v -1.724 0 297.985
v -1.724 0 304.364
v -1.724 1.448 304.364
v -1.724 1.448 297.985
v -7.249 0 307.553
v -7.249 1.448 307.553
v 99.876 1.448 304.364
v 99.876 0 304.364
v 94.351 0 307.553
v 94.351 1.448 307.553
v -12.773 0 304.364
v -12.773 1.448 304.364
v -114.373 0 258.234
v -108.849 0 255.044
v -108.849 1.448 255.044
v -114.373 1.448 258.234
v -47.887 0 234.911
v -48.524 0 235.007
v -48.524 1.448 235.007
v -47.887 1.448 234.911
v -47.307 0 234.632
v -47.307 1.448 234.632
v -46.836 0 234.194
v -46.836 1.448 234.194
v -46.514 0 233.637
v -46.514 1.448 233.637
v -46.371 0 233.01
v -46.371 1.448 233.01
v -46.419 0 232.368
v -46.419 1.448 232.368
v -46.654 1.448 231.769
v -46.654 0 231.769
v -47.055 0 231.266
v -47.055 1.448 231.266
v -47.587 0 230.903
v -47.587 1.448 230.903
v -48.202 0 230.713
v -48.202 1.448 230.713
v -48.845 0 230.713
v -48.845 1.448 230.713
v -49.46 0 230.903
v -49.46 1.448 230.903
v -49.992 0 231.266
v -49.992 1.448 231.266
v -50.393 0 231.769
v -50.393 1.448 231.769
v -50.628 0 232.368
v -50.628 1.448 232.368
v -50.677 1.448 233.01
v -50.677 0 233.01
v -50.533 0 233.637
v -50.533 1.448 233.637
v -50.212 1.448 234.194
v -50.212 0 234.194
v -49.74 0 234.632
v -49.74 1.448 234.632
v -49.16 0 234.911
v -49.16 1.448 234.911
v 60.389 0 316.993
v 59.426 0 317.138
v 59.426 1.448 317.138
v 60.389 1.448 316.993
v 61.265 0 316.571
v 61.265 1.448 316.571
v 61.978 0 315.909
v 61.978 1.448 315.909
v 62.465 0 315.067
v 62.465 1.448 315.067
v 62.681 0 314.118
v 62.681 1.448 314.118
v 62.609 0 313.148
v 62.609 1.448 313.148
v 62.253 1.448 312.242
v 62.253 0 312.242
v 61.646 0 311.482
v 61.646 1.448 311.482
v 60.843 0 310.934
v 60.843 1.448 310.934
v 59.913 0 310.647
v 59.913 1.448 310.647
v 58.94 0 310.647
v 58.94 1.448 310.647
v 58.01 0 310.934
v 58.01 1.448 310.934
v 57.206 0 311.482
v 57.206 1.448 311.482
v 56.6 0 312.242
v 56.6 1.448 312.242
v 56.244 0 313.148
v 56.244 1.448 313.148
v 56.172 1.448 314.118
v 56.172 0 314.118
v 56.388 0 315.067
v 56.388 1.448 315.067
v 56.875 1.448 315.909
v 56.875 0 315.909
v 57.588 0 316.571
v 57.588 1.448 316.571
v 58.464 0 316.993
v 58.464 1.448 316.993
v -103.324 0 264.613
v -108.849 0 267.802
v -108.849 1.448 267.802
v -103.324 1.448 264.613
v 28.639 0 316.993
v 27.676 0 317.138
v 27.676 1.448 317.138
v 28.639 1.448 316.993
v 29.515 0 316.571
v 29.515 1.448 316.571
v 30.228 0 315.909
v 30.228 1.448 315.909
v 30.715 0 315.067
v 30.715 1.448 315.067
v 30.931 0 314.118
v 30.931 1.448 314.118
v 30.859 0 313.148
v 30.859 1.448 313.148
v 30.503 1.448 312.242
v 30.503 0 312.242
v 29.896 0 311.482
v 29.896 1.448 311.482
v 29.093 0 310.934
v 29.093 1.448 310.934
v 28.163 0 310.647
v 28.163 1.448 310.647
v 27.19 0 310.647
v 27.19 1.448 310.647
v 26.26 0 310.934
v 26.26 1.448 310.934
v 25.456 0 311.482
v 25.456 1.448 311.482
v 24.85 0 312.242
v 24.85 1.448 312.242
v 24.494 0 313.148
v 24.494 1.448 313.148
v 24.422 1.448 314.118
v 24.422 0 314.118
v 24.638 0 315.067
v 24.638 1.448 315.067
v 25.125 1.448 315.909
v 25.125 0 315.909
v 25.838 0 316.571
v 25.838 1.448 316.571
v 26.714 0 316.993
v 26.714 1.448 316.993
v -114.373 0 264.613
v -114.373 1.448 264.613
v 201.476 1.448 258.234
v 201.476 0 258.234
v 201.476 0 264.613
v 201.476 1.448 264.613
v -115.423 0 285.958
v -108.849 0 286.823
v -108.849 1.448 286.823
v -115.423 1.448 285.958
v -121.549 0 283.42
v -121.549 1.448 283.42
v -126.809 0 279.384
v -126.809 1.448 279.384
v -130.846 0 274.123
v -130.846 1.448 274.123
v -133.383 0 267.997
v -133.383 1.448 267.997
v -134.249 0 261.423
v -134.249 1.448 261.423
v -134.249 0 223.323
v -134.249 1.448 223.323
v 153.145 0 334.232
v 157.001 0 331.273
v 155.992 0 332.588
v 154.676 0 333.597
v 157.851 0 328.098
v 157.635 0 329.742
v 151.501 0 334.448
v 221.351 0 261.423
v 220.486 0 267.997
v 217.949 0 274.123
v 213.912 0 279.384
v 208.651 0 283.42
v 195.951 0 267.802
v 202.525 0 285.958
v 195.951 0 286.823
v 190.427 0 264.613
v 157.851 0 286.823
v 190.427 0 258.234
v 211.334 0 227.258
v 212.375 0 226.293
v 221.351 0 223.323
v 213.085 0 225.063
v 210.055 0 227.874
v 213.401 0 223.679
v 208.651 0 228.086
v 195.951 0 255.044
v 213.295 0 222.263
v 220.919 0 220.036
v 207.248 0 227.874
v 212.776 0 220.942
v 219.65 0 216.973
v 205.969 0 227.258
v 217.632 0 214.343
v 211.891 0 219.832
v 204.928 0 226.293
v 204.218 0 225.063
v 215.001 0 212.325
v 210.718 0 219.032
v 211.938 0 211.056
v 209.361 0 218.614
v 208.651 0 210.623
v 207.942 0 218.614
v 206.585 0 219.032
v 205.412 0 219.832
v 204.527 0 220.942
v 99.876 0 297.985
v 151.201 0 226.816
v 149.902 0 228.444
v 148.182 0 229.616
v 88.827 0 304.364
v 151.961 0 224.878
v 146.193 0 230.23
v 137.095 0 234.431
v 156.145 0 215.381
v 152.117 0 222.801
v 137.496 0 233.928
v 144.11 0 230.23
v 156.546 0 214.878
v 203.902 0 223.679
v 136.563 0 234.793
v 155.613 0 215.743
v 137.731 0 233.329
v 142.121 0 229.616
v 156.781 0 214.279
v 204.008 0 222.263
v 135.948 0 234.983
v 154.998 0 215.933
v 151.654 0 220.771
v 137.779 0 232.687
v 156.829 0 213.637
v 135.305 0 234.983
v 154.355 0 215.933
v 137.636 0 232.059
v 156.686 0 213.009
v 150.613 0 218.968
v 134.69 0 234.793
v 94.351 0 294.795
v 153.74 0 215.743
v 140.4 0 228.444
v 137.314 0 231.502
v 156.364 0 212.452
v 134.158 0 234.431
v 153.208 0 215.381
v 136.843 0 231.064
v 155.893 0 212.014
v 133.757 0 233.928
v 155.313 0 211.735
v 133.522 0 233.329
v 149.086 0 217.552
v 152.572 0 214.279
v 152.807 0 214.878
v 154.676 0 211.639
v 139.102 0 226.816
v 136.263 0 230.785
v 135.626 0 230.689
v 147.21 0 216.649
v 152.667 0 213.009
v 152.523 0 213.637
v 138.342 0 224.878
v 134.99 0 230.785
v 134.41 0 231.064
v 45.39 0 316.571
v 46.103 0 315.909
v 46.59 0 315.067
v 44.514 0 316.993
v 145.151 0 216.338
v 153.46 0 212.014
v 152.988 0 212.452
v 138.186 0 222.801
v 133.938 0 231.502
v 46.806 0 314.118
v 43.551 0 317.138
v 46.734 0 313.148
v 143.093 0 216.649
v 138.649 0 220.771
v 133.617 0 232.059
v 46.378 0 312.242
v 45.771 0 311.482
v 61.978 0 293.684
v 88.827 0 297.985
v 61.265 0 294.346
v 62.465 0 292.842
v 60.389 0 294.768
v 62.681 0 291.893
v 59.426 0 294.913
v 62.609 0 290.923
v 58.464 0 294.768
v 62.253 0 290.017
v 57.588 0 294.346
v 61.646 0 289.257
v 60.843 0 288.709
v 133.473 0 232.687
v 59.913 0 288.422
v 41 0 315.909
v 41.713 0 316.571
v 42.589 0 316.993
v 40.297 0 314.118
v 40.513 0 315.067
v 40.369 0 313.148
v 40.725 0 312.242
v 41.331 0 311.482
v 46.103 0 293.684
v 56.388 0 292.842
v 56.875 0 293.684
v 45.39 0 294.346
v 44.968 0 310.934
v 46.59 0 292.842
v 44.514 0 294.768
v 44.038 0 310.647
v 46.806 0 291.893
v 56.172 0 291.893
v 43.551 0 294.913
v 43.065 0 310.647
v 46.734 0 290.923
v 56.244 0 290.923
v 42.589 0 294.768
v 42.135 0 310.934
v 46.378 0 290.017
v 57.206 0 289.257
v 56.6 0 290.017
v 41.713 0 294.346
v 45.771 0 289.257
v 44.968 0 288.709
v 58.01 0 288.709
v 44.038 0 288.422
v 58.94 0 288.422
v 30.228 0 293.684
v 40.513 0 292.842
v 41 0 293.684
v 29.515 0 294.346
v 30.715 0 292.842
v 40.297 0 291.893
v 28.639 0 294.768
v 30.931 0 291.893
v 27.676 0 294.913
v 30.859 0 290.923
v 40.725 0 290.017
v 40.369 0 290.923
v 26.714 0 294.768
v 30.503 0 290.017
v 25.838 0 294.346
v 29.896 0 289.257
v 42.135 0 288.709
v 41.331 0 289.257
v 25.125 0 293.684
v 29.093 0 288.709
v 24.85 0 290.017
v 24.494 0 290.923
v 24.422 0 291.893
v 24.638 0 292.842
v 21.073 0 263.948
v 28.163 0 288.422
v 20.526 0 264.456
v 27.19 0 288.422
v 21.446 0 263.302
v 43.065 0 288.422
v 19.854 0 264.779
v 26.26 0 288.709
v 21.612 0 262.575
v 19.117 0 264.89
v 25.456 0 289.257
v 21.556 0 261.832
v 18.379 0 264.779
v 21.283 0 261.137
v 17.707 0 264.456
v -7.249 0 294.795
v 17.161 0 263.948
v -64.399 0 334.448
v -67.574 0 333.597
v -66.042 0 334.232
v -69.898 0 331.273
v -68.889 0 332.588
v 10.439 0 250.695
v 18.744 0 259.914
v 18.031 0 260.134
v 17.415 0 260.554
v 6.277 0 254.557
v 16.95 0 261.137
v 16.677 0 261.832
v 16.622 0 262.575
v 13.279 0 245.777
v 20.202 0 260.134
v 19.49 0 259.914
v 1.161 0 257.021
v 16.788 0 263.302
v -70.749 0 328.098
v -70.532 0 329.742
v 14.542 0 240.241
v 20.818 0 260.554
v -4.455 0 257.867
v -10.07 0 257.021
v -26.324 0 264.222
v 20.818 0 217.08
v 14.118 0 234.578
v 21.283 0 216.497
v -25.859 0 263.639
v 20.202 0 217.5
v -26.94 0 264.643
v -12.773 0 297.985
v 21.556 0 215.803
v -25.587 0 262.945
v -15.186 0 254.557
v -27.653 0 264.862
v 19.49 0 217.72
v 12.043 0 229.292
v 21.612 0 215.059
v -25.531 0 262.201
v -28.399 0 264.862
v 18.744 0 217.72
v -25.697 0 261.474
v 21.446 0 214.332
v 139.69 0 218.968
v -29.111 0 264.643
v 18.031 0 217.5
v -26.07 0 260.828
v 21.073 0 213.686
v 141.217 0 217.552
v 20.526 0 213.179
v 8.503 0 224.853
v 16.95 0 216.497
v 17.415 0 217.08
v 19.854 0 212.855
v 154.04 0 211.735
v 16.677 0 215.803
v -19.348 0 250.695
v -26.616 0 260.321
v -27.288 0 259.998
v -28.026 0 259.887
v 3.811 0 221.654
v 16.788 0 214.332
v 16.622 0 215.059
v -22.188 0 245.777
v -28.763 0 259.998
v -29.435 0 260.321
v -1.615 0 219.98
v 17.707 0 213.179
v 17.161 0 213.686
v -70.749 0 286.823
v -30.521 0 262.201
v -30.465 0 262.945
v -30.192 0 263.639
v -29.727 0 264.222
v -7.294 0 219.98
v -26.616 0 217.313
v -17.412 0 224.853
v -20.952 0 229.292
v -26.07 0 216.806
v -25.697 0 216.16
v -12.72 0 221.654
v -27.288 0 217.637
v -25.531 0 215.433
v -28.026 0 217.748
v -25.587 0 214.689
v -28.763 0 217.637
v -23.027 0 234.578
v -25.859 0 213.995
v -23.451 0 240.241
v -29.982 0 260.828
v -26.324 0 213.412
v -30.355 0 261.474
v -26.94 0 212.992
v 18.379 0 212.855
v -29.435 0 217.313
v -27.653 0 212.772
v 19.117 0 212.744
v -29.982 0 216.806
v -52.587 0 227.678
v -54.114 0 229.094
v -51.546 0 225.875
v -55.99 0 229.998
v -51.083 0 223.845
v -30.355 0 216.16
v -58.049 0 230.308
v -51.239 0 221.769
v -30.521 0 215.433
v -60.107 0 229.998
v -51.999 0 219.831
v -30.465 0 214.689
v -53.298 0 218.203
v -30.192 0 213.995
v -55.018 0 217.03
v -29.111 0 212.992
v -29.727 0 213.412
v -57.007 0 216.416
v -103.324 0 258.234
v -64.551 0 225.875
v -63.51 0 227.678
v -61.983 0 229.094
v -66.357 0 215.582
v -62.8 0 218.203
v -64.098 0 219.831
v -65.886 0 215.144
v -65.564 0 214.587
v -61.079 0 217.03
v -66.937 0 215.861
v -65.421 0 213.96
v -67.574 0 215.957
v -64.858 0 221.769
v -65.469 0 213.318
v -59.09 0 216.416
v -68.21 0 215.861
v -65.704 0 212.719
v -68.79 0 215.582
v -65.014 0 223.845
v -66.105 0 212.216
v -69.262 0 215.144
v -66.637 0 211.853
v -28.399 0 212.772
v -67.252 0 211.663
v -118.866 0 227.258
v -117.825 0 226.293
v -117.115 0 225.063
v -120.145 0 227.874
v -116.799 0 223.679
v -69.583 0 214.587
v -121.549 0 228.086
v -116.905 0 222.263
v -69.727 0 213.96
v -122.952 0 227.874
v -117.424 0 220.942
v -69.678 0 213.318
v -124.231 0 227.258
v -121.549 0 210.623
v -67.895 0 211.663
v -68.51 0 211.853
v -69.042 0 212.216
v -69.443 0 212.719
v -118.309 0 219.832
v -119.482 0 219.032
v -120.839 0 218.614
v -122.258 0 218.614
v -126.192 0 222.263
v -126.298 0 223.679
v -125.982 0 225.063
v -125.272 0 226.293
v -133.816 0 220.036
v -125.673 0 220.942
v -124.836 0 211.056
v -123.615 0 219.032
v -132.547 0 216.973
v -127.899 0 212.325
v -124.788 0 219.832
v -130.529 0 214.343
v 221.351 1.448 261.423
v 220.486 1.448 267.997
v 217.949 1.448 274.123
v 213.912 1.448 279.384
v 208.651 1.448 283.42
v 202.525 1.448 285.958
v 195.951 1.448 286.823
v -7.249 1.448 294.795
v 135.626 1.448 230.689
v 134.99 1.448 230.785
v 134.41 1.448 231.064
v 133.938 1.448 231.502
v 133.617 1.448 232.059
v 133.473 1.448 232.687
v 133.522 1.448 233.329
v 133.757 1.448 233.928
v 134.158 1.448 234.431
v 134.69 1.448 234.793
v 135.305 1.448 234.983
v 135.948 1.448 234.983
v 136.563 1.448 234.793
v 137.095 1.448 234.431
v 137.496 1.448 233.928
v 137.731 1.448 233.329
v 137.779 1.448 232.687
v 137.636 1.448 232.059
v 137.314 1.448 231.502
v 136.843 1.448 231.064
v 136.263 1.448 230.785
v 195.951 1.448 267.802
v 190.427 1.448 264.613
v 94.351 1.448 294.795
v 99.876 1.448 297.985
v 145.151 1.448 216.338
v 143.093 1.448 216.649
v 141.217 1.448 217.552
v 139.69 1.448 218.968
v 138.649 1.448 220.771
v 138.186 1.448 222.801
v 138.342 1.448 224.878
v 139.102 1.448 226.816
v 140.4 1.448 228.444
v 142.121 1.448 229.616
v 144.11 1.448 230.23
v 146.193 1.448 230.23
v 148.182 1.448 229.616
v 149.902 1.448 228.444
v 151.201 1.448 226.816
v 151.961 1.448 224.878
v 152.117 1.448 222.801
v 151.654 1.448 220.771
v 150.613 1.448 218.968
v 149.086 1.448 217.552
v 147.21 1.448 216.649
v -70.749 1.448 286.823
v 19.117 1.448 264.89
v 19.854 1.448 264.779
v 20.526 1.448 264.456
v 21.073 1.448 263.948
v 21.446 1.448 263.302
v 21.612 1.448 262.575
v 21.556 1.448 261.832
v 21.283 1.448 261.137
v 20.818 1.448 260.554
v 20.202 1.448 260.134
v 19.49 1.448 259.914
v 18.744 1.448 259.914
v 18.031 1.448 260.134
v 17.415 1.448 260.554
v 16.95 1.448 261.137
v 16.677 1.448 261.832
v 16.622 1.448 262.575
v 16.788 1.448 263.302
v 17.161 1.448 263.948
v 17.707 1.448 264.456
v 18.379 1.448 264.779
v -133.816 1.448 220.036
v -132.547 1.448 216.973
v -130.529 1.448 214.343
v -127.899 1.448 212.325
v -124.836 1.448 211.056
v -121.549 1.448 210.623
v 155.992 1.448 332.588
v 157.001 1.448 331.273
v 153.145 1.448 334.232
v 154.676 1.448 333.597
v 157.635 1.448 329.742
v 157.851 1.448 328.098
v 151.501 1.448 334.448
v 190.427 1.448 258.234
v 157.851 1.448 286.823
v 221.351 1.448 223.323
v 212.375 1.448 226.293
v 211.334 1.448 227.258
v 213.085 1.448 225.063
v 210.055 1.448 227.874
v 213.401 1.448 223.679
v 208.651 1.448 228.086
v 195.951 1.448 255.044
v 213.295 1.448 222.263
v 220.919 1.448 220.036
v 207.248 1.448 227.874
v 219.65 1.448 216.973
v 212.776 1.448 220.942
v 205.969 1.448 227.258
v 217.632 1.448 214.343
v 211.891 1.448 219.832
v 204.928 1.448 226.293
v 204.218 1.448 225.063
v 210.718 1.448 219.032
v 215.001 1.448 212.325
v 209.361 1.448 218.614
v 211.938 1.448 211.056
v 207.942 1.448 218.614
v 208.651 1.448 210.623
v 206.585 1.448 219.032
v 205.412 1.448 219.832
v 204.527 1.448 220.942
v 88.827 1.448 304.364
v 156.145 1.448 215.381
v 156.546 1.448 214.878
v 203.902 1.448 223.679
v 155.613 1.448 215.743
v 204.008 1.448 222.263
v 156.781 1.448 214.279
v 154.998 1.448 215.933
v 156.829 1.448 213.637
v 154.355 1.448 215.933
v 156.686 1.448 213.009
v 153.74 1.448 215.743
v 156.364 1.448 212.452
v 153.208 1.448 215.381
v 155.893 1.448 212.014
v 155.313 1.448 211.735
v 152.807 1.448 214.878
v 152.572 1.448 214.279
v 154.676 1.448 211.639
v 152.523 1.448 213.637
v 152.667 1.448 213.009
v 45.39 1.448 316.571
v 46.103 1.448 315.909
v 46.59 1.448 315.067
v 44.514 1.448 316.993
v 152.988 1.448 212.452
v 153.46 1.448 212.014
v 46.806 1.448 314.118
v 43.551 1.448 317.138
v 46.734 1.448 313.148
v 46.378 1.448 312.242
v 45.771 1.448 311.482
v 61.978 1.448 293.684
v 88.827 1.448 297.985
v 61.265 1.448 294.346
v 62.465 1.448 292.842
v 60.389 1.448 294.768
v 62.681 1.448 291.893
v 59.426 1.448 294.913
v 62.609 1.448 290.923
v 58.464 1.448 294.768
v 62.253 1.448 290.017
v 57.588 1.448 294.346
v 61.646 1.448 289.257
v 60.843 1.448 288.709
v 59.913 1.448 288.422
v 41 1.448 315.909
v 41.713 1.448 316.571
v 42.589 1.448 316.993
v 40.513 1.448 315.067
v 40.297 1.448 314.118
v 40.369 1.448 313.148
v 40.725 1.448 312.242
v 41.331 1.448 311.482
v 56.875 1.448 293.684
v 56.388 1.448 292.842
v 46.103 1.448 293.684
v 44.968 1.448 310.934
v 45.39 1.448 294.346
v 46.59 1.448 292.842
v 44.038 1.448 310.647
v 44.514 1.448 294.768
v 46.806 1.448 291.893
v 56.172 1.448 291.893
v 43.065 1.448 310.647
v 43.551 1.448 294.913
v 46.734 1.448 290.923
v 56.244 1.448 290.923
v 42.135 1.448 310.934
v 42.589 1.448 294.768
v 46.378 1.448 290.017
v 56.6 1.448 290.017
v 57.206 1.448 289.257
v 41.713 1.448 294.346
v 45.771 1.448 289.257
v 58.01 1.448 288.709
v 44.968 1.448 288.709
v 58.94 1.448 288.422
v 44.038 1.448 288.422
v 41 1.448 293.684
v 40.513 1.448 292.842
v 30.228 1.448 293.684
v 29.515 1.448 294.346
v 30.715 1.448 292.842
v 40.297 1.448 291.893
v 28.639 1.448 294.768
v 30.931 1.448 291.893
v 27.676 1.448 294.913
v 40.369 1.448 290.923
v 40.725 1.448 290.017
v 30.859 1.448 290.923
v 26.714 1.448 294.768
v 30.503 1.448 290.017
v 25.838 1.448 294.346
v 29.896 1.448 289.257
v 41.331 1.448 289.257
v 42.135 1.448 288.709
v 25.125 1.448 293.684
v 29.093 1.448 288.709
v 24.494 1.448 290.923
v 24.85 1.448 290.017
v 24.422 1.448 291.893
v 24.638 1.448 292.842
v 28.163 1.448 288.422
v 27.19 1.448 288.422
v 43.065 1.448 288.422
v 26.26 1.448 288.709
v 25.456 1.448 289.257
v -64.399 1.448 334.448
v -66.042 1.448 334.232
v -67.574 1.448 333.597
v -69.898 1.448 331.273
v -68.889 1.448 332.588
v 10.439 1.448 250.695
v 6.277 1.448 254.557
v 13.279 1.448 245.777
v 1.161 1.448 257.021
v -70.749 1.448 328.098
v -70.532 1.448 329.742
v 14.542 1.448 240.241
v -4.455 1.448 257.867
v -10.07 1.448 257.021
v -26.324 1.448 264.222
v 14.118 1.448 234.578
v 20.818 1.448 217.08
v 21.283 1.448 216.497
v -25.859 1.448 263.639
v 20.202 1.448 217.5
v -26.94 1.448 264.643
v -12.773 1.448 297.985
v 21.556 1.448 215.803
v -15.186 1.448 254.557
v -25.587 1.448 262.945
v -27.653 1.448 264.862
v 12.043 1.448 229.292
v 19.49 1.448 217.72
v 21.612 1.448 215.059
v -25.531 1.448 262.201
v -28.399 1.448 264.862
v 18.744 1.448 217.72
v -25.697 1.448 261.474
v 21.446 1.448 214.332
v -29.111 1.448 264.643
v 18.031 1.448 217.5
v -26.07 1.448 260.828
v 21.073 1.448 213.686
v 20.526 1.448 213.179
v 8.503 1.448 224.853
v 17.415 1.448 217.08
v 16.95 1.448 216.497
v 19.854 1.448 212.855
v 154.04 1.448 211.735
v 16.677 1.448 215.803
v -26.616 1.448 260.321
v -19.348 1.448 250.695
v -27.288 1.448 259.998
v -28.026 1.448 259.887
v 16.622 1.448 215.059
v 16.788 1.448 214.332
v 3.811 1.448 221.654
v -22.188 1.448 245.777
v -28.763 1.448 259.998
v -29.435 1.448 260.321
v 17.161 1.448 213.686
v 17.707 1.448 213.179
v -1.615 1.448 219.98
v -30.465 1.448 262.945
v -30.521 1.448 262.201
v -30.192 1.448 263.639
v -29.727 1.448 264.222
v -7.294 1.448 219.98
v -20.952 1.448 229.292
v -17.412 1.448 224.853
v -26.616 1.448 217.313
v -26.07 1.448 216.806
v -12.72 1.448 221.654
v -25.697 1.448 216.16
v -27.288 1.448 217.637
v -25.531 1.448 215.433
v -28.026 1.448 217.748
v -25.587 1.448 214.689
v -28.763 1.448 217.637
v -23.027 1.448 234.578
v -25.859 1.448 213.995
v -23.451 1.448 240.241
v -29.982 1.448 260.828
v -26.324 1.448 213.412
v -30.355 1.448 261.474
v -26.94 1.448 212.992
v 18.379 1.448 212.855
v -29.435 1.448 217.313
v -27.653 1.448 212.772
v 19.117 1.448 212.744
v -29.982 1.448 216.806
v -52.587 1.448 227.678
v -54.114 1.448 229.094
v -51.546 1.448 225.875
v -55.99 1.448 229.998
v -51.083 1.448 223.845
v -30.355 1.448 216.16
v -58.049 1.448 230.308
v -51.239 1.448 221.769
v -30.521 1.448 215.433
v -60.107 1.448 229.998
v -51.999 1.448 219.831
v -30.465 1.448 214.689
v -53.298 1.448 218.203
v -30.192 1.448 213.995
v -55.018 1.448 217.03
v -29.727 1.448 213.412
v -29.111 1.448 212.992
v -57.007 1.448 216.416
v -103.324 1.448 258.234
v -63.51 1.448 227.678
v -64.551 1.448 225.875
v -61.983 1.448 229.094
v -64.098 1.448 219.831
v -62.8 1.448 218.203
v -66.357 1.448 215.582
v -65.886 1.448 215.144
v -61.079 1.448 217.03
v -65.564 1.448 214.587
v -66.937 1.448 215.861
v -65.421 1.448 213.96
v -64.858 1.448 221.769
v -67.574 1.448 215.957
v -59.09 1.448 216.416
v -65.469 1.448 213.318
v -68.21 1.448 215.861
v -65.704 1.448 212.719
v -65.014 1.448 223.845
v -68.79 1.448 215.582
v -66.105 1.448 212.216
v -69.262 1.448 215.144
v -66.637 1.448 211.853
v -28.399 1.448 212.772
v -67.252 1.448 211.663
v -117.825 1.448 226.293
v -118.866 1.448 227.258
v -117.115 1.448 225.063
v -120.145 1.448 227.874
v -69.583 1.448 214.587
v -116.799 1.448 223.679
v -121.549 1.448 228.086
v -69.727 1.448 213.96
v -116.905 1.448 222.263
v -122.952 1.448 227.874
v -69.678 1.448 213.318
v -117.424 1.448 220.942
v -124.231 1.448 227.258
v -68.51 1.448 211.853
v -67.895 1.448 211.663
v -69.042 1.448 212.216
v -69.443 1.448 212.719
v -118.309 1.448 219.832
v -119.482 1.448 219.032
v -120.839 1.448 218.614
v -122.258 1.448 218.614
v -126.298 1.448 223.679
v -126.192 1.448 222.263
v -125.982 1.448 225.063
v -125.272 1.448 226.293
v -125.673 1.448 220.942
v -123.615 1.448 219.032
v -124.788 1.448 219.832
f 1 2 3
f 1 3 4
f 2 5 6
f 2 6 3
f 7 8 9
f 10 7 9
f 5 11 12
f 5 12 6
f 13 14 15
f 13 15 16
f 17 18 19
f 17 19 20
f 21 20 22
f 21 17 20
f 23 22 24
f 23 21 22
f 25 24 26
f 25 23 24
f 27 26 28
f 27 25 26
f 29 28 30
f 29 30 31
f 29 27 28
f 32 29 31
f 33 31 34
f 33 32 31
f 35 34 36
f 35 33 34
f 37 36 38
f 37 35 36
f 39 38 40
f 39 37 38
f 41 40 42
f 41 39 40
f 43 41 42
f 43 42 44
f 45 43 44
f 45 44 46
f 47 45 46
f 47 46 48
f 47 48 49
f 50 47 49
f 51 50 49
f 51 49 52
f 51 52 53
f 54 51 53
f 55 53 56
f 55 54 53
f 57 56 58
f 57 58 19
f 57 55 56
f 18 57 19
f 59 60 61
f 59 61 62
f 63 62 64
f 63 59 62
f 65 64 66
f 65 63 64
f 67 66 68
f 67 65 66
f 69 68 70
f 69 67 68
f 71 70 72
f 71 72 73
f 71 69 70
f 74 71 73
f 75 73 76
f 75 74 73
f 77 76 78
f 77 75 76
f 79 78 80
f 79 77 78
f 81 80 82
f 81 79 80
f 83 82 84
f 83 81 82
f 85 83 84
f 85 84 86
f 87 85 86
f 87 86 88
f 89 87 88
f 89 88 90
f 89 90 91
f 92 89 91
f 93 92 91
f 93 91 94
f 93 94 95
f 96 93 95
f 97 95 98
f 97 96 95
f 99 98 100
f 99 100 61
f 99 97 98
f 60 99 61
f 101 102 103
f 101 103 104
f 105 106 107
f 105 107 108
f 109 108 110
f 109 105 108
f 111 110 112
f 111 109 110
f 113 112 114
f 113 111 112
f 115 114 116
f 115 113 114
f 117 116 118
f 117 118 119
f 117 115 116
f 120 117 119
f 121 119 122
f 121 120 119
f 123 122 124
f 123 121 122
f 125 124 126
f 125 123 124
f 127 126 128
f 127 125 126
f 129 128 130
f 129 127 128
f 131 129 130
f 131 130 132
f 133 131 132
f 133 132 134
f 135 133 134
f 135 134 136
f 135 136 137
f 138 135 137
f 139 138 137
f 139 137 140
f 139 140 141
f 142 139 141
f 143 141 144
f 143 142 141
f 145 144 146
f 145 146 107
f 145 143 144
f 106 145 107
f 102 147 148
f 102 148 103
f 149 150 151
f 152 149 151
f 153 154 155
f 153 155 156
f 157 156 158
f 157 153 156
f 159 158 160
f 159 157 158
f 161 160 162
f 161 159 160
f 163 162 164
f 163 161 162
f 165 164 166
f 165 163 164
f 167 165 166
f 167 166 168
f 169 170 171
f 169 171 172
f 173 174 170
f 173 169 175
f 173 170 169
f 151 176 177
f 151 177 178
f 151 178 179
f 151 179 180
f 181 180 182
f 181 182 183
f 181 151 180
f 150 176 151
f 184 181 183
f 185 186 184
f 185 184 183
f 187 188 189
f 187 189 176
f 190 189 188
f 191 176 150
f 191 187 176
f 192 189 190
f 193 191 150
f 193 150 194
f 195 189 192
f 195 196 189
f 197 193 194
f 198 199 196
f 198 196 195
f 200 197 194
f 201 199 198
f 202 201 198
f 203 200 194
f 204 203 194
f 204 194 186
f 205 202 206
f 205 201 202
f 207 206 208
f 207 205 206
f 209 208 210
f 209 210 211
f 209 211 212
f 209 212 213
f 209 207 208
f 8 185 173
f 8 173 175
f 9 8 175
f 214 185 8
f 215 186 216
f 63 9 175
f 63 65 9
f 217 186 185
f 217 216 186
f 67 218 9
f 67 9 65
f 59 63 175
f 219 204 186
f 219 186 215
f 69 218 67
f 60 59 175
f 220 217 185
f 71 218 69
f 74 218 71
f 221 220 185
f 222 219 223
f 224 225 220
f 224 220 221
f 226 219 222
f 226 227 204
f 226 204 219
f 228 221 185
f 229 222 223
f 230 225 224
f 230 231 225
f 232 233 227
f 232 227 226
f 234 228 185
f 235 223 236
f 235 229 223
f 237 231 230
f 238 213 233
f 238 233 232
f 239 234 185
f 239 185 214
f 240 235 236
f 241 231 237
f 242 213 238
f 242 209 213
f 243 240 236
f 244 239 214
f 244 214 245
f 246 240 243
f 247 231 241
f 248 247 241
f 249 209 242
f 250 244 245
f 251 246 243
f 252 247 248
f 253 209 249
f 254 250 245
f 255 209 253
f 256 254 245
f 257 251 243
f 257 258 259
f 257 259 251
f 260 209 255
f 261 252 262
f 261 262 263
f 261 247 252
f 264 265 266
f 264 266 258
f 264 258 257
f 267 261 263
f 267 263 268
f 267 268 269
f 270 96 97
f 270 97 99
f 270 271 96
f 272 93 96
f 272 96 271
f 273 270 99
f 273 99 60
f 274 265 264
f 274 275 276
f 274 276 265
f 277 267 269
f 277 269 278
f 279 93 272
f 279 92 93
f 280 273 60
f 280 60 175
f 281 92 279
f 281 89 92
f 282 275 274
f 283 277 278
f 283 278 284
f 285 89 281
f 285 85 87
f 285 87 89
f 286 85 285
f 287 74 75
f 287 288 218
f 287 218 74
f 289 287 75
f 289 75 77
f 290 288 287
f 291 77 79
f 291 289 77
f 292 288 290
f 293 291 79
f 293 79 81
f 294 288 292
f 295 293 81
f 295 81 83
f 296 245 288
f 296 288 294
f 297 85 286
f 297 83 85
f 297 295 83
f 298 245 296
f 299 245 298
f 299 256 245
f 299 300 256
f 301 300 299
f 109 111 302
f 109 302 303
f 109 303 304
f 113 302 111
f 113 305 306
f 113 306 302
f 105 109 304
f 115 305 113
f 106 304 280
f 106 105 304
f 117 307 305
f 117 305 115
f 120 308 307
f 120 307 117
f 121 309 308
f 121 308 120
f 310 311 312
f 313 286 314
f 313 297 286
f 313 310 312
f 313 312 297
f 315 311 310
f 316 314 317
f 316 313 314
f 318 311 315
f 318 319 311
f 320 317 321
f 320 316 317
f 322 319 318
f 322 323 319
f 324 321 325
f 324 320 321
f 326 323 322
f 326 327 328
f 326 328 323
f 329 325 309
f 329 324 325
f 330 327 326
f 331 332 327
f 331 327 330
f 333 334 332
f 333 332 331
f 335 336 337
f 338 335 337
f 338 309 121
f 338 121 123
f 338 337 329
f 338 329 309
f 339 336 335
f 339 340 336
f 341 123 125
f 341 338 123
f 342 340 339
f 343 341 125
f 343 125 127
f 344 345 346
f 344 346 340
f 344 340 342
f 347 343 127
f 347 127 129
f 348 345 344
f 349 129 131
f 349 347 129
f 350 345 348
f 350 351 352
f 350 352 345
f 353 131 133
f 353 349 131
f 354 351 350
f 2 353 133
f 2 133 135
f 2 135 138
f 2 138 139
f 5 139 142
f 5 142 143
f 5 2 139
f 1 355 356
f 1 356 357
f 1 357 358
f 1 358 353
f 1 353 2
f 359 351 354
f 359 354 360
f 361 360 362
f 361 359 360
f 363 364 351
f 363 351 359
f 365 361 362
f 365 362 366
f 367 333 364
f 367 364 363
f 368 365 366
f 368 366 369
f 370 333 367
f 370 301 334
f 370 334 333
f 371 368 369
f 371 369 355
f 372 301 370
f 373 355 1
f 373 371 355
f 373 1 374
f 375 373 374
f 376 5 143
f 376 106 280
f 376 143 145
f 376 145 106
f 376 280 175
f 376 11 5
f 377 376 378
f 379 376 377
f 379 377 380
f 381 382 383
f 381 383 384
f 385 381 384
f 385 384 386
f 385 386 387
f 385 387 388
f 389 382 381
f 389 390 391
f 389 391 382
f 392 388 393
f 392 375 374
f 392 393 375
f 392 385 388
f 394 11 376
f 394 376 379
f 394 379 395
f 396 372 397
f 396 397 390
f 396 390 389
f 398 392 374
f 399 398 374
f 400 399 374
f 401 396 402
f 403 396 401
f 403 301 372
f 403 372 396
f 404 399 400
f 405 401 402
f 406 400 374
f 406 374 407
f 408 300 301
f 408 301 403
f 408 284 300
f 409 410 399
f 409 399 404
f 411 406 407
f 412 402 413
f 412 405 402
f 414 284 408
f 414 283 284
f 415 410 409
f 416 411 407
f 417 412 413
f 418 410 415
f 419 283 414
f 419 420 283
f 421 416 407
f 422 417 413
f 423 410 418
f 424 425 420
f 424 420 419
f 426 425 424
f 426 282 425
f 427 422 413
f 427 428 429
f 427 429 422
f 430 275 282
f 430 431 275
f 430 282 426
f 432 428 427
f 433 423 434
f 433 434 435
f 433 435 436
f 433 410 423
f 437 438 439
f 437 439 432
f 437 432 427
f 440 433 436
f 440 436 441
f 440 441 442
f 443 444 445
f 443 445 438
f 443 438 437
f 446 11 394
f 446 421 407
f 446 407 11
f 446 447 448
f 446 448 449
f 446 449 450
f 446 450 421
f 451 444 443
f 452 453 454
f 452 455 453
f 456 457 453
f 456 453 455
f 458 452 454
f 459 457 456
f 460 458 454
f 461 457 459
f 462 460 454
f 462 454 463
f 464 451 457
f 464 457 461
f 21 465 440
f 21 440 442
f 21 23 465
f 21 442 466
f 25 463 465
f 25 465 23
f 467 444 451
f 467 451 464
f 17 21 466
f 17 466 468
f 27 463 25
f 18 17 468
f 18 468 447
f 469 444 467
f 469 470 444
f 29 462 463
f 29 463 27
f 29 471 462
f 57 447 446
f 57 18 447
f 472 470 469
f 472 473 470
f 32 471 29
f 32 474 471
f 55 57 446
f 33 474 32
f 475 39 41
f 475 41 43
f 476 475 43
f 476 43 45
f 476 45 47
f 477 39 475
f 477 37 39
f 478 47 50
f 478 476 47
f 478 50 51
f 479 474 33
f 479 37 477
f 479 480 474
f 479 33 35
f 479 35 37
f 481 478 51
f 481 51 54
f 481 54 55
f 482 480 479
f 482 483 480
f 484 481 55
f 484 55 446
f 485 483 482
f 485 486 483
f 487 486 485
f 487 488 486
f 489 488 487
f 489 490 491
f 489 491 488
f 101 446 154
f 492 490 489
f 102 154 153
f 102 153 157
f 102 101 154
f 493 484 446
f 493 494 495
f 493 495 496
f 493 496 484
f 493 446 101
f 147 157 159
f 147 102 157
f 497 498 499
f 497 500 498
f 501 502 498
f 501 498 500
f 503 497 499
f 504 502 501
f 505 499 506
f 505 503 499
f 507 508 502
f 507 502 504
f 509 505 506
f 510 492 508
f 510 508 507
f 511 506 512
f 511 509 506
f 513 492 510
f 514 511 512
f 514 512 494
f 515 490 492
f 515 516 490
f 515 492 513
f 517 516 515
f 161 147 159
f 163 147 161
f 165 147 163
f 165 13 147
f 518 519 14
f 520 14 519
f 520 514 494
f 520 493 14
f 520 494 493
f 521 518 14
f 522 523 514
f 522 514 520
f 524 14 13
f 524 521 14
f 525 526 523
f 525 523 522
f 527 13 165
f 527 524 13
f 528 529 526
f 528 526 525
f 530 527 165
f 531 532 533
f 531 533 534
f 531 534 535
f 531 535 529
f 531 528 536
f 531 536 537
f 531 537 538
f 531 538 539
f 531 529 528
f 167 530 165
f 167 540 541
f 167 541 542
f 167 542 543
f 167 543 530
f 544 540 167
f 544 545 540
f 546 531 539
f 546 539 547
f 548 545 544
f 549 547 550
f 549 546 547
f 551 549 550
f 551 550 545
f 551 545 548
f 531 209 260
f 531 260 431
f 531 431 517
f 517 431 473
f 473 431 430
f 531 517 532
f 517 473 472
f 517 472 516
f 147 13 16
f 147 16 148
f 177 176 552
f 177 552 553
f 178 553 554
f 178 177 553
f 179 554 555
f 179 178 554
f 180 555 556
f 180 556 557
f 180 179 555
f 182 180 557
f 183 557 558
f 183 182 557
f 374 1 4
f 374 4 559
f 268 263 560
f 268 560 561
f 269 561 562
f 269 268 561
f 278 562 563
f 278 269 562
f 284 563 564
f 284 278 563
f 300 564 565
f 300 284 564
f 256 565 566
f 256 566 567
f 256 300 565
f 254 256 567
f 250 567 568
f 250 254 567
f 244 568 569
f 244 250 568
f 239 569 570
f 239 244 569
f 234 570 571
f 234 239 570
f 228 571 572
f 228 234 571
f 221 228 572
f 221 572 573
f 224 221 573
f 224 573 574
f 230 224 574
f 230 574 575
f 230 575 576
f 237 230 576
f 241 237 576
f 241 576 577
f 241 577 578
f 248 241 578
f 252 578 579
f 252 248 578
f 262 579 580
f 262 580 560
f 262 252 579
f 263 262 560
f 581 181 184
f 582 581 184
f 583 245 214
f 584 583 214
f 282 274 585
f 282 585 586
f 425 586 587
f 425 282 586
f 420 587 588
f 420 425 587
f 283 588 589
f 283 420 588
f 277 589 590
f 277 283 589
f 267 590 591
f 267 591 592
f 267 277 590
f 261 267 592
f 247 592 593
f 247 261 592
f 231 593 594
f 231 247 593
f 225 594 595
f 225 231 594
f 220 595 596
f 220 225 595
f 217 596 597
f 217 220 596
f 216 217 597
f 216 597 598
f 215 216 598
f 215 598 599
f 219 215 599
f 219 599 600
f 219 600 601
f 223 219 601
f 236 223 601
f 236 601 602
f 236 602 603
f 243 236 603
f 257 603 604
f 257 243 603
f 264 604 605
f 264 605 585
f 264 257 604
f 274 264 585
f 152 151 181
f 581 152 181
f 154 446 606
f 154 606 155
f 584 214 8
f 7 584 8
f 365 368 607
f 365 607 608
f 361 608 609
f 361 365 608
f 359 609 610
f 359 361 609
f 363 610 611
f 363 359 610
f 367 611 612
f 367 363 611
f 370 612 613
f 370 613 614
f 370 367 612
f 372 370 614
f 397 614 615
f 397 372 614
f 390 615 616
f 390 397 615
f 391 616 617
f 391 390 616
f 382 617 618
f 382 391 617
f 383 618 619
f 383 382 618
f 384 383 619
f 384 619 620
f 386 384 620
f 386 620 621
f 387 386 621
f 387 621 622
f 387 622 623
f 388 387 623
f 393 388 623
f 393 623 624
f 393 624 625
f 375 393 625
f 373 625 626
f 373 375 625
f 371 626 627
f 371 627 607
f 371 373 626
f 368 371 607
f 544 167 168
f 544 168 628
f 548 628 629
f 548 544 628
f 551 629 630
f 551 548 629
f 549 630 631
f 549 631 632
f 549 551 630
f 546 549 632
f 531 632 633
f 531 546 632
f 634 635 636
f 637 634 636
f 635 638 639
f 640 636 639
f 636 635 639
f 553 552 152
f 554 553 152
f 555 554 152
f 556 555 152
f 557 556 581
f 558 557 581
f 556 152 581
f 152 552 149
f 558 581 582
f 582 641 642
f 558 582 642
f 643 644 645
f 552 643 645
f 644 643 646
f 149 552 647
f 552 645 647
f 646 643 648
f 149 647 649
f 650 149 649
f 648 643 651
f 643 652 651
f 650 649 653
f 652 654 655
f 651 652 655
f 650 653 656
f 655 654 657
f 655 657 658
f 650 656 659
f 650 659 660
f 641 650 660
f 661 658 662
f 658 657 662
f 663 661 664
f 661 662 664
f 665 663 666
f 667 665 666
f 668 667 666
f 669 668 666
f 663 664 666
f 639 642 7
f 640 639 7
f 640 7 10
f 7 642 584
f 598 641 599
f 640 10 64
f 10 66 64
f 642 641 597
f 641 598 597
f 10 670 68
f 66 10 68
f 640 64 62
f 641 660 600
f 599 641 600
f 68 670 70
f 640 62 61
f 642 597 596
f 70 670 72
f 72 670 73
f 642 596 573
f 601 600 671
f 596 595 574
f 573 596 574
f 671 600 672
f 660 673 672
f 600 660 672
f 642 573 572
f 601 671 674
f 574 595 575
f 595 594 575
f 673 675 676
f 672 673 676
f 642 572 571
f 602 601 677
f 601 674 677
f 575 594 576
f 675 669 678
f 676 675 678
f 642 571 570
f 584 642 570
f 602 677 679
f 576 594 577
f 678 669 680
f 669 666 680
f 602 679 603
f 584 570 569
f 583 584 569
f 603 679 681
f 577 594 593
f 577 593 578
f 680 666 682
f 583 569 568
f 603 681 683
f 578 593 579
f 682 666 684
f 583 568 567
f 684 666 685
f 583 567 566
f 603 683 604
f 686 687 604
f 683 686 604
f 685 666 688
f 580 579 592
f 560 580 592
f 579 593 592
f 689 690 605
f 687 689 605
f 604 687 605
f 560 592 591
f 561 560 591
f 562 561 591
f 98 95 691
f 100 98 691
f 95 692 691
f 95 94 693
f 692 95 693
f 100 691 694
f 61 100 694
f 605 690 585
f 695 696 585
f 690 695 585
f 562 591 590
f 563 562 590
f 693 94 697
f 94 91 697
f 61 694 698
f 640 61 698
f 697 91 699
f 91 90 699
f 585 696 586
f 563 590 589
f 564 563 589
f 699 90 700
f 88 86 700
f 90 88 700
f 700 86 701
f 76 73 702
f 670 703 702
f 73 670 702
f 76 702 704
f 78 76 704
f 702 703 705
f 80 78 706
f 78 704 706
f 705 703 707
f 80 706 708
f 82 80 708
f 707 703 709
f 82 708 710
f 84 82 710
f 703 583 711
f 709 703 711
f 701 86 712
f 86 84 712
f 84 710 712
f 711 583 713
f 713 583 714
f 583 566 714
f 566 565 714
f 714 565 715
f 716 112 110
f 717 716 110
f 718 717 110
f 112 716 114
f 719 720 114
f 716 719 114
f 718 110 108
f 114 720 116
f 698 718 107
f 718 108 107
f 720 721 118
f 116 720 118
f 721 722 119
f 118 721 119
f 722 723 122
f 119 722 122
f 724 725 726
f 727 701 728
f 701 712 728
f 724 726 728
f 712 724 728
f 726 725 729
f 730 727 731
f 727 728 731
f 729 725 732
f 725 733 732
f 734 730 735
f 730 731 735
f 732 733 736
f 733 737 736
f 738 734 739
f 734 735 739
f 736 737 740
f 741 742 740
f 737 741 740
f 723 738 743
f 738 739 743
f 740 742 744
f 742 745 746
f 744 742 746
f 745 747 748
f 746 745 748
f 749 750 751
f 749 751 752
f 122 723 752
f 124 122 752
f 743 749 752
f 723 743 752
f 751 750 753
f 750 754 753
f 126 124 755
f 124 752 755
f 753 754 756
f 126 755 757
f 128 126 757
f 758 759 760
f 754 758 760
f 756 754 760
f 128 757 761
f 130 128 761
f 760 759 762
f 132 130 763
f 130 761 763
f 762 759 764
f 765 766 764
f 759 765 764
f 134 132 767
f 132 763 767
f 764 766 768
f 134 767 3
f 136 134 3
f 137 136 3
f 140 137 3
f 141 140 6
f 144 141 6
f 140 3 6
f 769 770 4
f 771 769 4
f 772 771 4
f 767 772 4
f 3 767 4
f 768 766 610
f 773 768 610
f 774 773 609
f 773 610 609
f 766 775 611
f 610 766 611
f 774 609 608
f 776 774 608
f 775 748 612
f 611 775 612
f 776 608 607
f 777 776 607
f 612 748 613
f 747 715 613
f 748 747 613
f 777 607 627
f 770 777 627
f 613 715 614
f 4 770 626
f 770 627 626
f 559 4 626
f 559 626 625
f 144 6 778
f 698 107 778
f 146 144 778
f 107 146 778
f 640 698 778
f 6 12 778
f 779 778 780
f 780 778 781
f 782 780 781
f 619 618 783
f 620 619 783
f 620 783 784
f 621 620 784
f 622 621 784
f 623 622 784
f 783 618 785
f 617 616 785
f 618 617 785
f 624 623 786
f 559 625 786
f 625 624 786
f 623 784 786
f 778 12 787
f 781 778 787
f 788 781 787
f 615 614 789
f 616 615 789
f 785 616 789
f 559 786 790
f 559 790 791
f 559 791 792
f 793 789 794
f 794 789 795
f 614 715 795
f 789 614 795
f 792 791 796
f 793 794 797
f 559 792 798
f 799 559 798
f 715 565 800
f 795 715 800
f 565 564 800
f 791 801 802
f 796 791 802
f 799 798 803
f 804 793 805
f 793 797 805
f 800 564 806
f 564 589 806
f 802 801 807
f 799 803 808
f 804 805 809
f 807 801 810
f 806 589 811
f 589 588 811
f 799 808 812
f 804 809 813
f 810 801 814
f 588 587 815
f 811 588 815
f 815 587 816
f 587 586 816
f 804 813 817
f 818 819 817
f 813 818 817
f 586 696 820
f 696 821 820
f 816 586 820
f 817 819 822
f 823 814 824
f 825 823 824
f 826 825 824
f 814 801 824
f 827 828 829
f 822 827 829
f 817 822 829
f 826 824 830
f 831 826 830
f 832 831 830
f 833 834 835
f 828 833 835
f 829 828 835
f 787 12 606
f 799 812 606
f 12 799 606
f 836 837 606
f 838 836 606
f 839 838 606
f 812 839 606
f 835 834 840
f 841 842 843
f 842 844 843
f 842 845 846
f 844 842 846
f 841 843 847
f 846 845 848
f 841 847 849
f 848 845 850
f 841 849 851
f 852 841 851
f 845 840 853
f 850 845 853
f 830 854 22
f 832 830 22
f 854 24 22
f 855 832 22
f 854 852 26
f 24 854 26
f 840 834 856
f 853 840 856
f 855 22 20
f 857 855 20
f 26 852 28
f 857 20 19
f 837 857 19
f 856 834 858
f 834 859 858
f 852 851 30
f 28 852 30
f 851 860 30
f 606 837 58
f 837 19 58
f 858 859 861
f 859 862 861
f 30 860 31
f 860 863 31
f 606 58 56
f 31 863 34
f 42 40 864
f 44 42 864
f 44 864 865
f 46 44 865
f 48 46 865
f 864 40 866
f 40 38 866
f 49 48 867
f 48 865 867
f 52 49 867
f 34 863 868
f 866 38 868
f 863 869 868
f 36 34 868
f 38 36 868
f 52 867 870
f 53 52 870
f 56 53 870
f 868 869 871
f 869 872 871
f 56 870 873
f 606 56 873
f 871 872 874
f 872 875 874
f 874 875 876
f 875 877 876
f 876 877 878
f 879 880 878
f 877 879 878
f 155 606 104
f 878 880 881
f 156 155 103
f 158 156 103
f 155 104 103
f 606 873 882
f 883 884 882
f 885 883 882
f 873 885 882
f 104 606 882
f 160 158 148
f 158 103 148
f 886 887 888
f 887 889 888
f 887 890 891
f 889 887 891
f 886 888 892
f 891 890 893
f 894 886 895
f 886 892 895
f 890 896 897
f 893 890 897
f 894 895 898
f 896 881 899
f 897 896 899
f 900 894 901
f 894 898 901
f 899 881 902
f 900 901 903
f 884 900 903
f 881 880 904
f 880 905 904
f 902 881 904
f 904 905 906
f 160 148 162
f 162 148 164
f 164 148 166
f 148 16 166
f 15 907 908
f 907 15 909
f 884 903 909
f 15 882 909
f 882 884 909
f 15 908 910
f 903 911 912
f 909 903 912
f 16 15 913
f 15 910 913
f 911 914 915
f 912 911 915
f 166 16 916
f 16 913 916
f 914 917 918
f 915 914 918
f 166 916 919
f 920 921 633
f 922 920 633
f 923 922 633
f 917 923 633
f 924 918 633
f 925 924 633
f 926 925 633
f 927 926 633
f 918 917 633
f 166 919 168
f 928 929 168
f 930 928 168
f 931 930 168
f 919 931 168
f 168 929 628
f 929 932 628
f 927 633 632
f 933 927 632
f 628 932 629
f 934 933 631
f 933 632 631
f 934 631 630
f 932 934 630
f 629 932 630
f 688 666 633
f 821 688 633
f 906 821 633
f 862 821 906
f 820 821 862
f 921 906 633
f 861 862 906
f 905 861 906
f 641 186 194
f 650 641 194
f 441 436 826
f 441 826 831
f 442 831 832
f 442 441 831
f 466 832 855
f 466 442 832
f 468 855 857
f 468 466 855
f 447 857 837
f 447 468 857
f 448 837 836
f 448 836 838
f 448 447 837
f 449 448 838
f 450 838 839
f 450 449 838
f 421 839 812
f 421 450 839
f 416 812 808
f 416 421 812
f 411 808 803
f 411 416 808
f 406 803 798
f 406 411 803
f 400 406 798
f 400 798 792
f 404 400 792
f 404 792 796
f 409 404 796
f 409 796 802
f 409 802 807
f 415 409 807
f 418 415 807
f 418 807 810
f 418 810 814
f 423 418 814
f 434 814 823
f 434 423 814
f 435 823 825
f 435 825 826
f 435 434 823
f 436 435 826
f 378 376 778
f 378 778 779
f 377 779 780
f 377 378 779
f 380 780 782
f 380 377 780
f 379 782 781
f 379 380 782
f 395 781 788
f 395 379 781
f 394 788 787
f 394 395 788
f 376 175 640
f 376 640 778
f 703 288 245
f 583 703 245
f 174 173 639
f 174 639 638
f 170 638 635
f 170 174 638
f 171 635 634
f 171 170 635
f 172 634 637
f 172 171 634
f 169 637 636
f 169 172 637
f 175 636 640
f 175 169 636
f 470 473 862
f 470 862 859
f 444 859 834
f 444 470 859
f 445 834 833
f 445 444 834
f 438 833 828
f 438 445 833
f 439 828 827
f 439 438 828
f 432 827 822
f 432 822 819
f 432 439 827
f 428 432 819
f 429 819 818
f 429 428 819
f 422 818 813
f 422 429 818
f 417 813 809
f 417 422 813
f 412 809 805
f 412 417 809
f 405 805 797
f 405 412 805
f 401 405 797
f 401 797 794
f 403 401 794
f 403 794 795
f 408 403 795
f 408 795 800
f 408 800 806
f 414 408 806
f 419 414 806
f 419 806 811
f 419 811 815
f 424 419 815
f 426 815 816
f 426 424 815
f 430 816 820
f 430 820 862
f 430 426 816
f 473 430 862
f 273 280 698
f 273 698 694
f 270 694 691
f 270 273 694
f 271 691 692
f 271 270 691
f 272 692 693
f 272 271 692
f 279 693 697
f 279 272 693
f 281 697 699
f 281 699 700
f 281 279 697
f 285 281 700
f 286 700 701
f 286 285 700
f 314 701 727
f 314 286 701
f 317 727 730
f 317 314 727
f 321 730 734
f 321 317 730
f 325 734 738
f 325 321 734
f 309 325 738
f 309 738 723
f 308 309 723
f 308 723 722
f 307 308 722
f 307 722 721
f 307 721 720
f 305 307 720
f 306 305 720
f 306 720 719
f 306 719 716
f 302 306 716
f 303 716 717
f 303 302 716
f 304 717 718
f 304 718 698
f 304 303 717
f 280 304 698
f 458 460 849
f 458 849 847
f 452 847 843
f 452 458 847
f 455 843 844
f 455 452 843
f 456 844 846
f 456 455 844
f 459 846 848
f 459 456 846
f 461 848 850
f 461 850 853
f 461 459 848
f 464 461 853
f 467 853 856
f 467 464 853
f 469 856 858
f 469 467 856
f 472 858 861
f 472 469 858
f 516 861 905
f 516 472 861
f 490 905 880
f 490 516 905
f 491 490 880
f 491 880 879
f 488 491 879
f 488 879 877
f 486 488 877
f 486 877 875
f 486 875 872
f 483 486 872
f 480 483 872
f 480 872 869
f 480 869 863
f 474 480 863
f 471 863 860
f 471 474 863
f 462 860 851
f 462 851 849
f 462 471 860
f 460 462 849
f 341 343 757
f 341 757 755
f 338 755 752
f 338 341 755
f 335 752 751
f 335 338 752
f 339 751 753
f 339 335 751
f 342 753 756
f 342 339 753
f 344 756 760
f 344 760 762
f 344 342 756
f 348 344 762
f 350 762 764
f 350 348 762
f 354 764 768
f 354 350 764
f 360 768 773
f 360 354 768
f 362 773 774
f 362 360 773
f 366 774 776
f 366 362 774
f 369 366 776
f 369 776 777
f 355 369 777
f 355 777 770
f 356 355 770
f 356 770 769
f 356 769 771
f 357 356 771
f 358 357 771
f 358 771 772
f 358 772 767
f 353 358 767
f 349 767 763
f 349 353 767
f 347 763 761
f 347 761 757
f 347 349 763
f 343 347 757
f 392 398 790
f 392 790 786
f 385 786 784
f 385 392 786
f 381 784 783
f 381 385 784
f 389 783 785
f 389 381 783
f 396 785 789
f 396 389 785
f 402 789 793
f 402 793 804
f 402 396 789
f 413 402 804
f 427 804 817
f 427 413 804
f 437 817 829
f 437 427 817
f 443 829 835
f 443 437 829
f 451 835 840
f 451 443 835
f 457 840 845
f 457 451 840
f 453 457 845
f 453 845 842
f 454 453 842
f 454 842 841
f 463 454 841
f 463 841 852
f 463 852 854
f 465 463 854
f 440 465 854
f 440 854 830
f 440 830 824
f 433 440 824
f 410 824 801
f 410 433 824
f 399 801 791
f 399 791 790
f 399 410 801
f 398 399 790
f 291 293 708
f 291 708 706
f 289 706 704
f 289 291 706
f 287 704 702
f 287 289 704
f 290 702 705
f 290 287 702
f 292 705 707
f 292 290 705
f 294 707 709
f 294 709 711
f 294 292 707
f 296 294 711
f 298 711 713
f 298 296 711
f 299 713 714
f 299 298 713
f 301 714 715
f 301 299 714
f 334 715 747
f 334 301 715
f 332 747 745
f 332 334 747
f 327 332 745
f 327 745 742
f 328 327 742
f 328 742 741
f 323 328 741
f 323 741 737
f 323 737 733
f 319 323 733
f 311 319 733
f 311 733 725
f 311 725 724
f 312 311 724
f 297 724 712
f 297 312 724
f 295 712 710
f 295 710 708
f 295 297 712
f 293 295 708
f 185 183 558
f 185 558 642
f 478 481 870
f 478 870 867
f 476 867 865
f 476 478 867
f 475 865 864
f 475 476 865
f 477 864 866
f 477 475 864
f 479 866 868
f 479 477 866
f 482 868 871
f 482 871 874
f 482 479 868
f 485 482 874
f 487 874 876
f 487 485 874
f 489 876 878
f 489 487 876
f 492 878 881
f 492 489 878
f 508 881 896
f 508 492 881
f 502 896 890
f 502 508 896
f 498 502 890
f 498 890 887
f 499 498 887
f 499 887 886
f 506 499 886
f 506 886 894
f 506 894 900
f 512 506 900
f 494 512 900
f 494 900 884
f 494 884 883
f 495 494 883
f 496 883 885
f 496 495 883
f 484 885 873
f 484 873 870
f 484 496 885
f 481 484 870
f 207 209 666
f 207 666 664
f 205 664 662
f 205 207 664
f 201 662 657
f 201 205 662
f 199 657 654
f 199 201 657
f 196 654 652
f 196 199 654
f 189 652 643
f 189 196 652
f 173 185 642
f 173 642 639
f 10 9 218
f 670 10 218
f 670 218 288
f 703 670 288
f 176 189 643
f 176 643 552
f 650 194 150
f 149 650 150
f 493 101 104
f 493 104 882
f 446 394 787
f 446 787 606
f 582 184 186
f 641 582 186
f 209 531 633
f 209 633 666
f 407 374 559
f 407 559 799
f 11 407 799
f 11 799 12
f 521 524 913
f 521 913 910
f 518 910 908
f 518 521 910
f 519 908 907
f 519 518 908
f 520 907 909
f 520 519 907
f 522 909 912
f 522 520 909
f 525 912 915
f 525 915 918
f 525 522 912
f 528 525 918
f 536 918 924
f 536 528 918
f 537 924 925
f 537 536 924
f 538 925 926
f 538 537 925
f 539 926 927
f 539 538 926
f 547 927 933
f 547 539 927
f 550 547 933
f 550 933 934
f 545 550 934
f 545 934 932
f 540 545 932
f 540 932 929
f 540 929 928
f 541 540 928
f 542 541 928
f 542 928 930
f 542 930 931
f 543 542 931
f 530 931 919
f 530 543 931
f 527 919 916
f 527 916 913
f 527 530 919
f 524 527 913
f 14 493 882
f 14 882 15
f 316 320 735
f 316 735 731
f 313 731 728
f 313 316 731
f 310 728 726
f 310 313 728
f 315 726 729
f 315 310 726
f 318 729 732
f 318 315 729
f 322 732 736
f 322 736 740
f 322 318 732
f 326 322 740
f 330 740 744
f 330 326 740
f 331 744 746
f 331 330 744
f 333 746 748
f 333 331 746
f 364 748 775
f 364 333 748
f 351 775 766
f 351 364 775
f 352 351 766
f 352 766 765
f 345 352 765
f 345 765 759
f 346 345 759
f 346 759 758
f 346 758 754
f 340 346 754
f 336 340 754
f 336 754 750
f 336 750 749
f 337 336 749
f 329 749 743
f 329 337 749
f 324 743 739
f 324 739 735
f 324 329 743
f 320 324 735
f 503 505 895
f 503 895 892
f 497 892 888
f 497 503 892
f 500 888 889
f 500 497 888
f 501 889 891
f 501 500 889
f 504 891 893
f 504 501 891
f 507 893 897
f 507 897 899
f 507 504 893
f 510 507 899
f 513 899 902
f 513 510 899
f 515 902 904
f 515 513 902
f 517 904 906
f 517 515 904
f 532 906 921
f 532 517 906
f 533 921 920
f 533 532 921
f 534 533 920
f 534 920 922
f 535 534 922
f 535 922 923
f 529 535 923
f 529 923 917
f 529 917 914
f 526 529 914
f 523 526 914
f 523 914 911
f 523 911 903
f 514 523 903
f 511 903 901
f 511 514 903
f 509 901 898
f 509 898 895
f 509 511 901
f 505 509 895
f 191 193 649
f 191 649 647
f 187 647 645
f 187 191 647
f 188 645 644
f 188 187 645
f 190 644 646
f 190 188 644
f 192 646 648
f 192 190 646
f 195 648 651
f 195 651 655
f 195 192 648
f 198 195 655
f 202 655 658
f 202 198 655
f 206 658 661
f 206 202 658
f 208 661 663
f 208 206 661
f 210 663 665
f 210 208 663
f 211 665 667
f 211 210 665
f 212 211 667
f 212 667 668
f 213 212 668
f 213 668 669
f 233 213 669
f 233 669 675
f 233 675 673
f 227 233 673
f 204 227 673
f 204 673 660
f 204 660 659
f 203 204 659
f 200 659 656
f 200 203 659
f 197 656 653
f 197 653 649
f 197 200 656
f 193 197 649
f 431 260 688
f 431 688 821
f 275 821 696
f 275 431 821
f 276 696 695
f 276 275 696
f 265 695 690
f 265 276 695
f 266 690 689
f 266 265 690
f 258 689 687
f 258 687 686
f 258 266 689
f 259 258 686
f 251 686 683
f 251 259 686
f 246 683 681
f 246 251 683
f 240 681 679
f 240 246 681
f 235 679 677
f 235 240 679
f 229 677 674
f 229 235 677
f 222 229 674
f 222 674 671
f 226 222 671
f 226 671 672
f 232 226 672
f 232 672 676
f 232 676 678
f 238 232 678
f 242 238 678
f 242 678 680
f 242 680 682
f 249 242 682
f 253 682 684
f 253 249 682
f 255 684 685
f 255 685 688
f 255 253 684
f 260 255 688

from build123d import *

# Parameters (mm, degrees)
SKETCH1_R           = 3.2639
SKETCH1_R_2         = 2.5019
SKETCH1_R_3         = 6.985
SKETCH1_R_4         = 2.159
SKETCH1_R_5         = 19.05
SKETCH1_R_6         = 4.7625
BOSS_EXTRUDE1_DEPTH = 1.4478


with BuildPart() as part:
    # Sketch1 → Boss-Extrude1 (new body)
    with BuildSketch(Plane(origin=(0, 0, 0), x_dir=(1, 0, 0), z_dir=(0, 1, 0))):
        with BuildLine():
            Line((-70.748540962, -286.823205678), (-108.848540962, -286.823205678))
            ThreePointArc((-108.848540962, -286.823205678), (-126.809053204, -279.38371792), (-134.248540962, -261.423205678))
            Line((-134.248540962, -261.423205678), (-134.248540962, -223.323205678))
            ThreePointArc((-134.248540962, -223.323205678), (-130.528797083, -214.342949557), (-121.548540962, -210.623205678))
            Line((-121.548540962, -210.623205678), (208.651459038, -210.623205678))
            ThreePointArc((208.651459038, -210.623205678), (217.631715159, -214.342949557), (221.351459038, -223.323205678))
            Line((221.351459038, -223.323205678), (221.351459038, -261.423205678))
            ThreePointArc((221.351459038, -261.423205678), (213.911971281, -279.38371792), (195.951459038, -286.823205678))
            Line((195.951459038, -286.823205678), (157.851459038, -286.823205678))
            Line((157.851459038, -286.823205678), (157.851459038, -328.098205678))
            ThreePointArc((157.851459038, -328.098205678), (155.991587099, -332.588333738), (151.501459038, -334.448205678))
            Line((151.501459038, -334.448205678), (-64.398540962, -334.448205678))
            ThreePointArc((-64.398540962, -334.448205678), (-68.888669022, -332.588333738), (-70.748540962, -328.098205678))
            Line((-70.748540962, -328.098205678), (-70.748540962, -286.823205678))
        make_face()
        with Locations(Location((27.676459038, -291.649205678, 0), (0, 0, 270))):
            Circle(SKETCH1_R, mode=Mode.SUBTRACT)
        with Locations(Location((43.551459038, -291.649205678, 0), (0, 0, 270))):
            Circle(SKETCH1_R, mode=Mode.SUBTRACT)
        with Locations(Location((59.426459038, -291.649205678, 0), (0, 0, 270))):
            Circle(SKETCH1_R, mode=Mode.SUBTRACT)
        with Locations(Location((-28.025740962, -215.246005678, 0), (0, 0, 270))):
            Circle(SKETCH1_R_2, mode=Mode.SUBTRACT)
        with Locations(Location((-28.025740962, -262.388405678, 0), (0, 0, 90))):
            Circle(SKETCH1_R_2, mode=Mode.SUBTRACT)
        with Locations(Location((19.116659038, -215.246005678, 0), (0, 0, 90))):
            Circle(SKETCH1_R_2, mode=Mode.SUBTRACT)
        with Locations(Location((19.116659038, -262.388405678, 0), (0, 0, 270))):
            Circle(SKETCH1_R_2, mode=Mode.SUBTRACT)
        with Locations(Location((27.676459038, -313.874205678, 0), (0, 0, 270))):
            Circle(SKETCH1_R, mode=Mode.SUBTRACT)
        with Locations(Location((43.551459038, -313.874205678, 0), (0, 0, 270))):
            Circle(SKETCH1_R, mode=Mode.SUBTRACT)
        with Locations(Location((59.426459038, -313.874205678, 0), (0, 0, 270))):
            Circle(SKETCH1_R, mode=Mode.SUBTRACT)
        with Locations(Location((-58.048540962, -223.323205678, 0), (0, 0, 270))):
            Circle(SKETCH1_R_3, mode=Mode.SUBTRACT)
        with Locations(Location((-67.573540962, -213.798205678, 0), (0, 0, 270))):
            Circle(SKETCH1_R_4, mode=Mode.SUBTRACT)
        with Locations(Location((-48.523540962, -232.848205678, 0), (0, 0, 270))):
            Circle(SKETCH1_R_4, mode=Mode.SUBTRACT)
        with Locations(Location((-4.454540962, -238.817205678, 0), (0, 0, 270))):
            Circle(SKETCH1_R_5, mode=Mode.SUBTRACT)
        with Locations(Location((135.626459038, -232.848205678, 0), (0, 0, 90))):
            Circle(SKETCH1_R_4, mode=Mode.SUBTRACT)
        with Locations(Location((145.151459038, -223.323205678, 0), (0, 0, 90))):
            Circle(SKETCH1_R_3, mode=Mode.SUBTRACT)
        with Locations(Location((154.676459038, -213.798205678, 0), (0, 0, 90))):
            Circle(SKETCH1_R_4, mode=Mode.SUBTRACT)
        with Locations(Location((-121.548540962, -223.323205678, 0), (0, 0, 270))):
            Circle(SKETCH1_R_6, mode=Mode.SUBTRACT)
        with Locations(Location((208.651459038, -223.323205678, 0), (0, 0, 270))):
            Circle(SKETCH1_R_6, mode=Mode.SUBTRACT)
        Polygon((-1.724040962, -304.36377724), (-1.724040962, -297.984634115), (-7.248540962, -294.795062553), (-12.773040962, -297.984634115), (-12.773040962, -304.36377724), (-7.248540962, -307.553348802), align=None, mode=Mode.SUBTRACT)
        Polygon((94.351459038, -307.553348802), (88.826959038, -304.36377724), (88.826959038, -297.984634115), (94.351459038, -294.795062553), (99.875959038, -297.984634115), (99.875959038, -304.36377724), align=None, mode=Mode.SUBTRACT)
        Polygon((-103.324040962, -258.233634115), (-108.848540962, -255.044062553), (-114.373040962, -258.233634115), (-114.373040962, -264.61277724), (-108.848540962, -267.802348802), (-103.324040962, -264.61277724), align=None, mode=Mode.SUBTRACT)
        Polygon((201.475959038, -264.61277724), (195.951459038, -267.802348802), (190.426959038, -264.61277724), (190.426959038, -258.233634115), (195.951459038, -255.044062553), (201.475959038, -258.233634115), align=None, mode=Mode.SUBTRACT)
    extrude(amount=BOSS_EXTRUDE1_DEPTH)


solid = part.part
